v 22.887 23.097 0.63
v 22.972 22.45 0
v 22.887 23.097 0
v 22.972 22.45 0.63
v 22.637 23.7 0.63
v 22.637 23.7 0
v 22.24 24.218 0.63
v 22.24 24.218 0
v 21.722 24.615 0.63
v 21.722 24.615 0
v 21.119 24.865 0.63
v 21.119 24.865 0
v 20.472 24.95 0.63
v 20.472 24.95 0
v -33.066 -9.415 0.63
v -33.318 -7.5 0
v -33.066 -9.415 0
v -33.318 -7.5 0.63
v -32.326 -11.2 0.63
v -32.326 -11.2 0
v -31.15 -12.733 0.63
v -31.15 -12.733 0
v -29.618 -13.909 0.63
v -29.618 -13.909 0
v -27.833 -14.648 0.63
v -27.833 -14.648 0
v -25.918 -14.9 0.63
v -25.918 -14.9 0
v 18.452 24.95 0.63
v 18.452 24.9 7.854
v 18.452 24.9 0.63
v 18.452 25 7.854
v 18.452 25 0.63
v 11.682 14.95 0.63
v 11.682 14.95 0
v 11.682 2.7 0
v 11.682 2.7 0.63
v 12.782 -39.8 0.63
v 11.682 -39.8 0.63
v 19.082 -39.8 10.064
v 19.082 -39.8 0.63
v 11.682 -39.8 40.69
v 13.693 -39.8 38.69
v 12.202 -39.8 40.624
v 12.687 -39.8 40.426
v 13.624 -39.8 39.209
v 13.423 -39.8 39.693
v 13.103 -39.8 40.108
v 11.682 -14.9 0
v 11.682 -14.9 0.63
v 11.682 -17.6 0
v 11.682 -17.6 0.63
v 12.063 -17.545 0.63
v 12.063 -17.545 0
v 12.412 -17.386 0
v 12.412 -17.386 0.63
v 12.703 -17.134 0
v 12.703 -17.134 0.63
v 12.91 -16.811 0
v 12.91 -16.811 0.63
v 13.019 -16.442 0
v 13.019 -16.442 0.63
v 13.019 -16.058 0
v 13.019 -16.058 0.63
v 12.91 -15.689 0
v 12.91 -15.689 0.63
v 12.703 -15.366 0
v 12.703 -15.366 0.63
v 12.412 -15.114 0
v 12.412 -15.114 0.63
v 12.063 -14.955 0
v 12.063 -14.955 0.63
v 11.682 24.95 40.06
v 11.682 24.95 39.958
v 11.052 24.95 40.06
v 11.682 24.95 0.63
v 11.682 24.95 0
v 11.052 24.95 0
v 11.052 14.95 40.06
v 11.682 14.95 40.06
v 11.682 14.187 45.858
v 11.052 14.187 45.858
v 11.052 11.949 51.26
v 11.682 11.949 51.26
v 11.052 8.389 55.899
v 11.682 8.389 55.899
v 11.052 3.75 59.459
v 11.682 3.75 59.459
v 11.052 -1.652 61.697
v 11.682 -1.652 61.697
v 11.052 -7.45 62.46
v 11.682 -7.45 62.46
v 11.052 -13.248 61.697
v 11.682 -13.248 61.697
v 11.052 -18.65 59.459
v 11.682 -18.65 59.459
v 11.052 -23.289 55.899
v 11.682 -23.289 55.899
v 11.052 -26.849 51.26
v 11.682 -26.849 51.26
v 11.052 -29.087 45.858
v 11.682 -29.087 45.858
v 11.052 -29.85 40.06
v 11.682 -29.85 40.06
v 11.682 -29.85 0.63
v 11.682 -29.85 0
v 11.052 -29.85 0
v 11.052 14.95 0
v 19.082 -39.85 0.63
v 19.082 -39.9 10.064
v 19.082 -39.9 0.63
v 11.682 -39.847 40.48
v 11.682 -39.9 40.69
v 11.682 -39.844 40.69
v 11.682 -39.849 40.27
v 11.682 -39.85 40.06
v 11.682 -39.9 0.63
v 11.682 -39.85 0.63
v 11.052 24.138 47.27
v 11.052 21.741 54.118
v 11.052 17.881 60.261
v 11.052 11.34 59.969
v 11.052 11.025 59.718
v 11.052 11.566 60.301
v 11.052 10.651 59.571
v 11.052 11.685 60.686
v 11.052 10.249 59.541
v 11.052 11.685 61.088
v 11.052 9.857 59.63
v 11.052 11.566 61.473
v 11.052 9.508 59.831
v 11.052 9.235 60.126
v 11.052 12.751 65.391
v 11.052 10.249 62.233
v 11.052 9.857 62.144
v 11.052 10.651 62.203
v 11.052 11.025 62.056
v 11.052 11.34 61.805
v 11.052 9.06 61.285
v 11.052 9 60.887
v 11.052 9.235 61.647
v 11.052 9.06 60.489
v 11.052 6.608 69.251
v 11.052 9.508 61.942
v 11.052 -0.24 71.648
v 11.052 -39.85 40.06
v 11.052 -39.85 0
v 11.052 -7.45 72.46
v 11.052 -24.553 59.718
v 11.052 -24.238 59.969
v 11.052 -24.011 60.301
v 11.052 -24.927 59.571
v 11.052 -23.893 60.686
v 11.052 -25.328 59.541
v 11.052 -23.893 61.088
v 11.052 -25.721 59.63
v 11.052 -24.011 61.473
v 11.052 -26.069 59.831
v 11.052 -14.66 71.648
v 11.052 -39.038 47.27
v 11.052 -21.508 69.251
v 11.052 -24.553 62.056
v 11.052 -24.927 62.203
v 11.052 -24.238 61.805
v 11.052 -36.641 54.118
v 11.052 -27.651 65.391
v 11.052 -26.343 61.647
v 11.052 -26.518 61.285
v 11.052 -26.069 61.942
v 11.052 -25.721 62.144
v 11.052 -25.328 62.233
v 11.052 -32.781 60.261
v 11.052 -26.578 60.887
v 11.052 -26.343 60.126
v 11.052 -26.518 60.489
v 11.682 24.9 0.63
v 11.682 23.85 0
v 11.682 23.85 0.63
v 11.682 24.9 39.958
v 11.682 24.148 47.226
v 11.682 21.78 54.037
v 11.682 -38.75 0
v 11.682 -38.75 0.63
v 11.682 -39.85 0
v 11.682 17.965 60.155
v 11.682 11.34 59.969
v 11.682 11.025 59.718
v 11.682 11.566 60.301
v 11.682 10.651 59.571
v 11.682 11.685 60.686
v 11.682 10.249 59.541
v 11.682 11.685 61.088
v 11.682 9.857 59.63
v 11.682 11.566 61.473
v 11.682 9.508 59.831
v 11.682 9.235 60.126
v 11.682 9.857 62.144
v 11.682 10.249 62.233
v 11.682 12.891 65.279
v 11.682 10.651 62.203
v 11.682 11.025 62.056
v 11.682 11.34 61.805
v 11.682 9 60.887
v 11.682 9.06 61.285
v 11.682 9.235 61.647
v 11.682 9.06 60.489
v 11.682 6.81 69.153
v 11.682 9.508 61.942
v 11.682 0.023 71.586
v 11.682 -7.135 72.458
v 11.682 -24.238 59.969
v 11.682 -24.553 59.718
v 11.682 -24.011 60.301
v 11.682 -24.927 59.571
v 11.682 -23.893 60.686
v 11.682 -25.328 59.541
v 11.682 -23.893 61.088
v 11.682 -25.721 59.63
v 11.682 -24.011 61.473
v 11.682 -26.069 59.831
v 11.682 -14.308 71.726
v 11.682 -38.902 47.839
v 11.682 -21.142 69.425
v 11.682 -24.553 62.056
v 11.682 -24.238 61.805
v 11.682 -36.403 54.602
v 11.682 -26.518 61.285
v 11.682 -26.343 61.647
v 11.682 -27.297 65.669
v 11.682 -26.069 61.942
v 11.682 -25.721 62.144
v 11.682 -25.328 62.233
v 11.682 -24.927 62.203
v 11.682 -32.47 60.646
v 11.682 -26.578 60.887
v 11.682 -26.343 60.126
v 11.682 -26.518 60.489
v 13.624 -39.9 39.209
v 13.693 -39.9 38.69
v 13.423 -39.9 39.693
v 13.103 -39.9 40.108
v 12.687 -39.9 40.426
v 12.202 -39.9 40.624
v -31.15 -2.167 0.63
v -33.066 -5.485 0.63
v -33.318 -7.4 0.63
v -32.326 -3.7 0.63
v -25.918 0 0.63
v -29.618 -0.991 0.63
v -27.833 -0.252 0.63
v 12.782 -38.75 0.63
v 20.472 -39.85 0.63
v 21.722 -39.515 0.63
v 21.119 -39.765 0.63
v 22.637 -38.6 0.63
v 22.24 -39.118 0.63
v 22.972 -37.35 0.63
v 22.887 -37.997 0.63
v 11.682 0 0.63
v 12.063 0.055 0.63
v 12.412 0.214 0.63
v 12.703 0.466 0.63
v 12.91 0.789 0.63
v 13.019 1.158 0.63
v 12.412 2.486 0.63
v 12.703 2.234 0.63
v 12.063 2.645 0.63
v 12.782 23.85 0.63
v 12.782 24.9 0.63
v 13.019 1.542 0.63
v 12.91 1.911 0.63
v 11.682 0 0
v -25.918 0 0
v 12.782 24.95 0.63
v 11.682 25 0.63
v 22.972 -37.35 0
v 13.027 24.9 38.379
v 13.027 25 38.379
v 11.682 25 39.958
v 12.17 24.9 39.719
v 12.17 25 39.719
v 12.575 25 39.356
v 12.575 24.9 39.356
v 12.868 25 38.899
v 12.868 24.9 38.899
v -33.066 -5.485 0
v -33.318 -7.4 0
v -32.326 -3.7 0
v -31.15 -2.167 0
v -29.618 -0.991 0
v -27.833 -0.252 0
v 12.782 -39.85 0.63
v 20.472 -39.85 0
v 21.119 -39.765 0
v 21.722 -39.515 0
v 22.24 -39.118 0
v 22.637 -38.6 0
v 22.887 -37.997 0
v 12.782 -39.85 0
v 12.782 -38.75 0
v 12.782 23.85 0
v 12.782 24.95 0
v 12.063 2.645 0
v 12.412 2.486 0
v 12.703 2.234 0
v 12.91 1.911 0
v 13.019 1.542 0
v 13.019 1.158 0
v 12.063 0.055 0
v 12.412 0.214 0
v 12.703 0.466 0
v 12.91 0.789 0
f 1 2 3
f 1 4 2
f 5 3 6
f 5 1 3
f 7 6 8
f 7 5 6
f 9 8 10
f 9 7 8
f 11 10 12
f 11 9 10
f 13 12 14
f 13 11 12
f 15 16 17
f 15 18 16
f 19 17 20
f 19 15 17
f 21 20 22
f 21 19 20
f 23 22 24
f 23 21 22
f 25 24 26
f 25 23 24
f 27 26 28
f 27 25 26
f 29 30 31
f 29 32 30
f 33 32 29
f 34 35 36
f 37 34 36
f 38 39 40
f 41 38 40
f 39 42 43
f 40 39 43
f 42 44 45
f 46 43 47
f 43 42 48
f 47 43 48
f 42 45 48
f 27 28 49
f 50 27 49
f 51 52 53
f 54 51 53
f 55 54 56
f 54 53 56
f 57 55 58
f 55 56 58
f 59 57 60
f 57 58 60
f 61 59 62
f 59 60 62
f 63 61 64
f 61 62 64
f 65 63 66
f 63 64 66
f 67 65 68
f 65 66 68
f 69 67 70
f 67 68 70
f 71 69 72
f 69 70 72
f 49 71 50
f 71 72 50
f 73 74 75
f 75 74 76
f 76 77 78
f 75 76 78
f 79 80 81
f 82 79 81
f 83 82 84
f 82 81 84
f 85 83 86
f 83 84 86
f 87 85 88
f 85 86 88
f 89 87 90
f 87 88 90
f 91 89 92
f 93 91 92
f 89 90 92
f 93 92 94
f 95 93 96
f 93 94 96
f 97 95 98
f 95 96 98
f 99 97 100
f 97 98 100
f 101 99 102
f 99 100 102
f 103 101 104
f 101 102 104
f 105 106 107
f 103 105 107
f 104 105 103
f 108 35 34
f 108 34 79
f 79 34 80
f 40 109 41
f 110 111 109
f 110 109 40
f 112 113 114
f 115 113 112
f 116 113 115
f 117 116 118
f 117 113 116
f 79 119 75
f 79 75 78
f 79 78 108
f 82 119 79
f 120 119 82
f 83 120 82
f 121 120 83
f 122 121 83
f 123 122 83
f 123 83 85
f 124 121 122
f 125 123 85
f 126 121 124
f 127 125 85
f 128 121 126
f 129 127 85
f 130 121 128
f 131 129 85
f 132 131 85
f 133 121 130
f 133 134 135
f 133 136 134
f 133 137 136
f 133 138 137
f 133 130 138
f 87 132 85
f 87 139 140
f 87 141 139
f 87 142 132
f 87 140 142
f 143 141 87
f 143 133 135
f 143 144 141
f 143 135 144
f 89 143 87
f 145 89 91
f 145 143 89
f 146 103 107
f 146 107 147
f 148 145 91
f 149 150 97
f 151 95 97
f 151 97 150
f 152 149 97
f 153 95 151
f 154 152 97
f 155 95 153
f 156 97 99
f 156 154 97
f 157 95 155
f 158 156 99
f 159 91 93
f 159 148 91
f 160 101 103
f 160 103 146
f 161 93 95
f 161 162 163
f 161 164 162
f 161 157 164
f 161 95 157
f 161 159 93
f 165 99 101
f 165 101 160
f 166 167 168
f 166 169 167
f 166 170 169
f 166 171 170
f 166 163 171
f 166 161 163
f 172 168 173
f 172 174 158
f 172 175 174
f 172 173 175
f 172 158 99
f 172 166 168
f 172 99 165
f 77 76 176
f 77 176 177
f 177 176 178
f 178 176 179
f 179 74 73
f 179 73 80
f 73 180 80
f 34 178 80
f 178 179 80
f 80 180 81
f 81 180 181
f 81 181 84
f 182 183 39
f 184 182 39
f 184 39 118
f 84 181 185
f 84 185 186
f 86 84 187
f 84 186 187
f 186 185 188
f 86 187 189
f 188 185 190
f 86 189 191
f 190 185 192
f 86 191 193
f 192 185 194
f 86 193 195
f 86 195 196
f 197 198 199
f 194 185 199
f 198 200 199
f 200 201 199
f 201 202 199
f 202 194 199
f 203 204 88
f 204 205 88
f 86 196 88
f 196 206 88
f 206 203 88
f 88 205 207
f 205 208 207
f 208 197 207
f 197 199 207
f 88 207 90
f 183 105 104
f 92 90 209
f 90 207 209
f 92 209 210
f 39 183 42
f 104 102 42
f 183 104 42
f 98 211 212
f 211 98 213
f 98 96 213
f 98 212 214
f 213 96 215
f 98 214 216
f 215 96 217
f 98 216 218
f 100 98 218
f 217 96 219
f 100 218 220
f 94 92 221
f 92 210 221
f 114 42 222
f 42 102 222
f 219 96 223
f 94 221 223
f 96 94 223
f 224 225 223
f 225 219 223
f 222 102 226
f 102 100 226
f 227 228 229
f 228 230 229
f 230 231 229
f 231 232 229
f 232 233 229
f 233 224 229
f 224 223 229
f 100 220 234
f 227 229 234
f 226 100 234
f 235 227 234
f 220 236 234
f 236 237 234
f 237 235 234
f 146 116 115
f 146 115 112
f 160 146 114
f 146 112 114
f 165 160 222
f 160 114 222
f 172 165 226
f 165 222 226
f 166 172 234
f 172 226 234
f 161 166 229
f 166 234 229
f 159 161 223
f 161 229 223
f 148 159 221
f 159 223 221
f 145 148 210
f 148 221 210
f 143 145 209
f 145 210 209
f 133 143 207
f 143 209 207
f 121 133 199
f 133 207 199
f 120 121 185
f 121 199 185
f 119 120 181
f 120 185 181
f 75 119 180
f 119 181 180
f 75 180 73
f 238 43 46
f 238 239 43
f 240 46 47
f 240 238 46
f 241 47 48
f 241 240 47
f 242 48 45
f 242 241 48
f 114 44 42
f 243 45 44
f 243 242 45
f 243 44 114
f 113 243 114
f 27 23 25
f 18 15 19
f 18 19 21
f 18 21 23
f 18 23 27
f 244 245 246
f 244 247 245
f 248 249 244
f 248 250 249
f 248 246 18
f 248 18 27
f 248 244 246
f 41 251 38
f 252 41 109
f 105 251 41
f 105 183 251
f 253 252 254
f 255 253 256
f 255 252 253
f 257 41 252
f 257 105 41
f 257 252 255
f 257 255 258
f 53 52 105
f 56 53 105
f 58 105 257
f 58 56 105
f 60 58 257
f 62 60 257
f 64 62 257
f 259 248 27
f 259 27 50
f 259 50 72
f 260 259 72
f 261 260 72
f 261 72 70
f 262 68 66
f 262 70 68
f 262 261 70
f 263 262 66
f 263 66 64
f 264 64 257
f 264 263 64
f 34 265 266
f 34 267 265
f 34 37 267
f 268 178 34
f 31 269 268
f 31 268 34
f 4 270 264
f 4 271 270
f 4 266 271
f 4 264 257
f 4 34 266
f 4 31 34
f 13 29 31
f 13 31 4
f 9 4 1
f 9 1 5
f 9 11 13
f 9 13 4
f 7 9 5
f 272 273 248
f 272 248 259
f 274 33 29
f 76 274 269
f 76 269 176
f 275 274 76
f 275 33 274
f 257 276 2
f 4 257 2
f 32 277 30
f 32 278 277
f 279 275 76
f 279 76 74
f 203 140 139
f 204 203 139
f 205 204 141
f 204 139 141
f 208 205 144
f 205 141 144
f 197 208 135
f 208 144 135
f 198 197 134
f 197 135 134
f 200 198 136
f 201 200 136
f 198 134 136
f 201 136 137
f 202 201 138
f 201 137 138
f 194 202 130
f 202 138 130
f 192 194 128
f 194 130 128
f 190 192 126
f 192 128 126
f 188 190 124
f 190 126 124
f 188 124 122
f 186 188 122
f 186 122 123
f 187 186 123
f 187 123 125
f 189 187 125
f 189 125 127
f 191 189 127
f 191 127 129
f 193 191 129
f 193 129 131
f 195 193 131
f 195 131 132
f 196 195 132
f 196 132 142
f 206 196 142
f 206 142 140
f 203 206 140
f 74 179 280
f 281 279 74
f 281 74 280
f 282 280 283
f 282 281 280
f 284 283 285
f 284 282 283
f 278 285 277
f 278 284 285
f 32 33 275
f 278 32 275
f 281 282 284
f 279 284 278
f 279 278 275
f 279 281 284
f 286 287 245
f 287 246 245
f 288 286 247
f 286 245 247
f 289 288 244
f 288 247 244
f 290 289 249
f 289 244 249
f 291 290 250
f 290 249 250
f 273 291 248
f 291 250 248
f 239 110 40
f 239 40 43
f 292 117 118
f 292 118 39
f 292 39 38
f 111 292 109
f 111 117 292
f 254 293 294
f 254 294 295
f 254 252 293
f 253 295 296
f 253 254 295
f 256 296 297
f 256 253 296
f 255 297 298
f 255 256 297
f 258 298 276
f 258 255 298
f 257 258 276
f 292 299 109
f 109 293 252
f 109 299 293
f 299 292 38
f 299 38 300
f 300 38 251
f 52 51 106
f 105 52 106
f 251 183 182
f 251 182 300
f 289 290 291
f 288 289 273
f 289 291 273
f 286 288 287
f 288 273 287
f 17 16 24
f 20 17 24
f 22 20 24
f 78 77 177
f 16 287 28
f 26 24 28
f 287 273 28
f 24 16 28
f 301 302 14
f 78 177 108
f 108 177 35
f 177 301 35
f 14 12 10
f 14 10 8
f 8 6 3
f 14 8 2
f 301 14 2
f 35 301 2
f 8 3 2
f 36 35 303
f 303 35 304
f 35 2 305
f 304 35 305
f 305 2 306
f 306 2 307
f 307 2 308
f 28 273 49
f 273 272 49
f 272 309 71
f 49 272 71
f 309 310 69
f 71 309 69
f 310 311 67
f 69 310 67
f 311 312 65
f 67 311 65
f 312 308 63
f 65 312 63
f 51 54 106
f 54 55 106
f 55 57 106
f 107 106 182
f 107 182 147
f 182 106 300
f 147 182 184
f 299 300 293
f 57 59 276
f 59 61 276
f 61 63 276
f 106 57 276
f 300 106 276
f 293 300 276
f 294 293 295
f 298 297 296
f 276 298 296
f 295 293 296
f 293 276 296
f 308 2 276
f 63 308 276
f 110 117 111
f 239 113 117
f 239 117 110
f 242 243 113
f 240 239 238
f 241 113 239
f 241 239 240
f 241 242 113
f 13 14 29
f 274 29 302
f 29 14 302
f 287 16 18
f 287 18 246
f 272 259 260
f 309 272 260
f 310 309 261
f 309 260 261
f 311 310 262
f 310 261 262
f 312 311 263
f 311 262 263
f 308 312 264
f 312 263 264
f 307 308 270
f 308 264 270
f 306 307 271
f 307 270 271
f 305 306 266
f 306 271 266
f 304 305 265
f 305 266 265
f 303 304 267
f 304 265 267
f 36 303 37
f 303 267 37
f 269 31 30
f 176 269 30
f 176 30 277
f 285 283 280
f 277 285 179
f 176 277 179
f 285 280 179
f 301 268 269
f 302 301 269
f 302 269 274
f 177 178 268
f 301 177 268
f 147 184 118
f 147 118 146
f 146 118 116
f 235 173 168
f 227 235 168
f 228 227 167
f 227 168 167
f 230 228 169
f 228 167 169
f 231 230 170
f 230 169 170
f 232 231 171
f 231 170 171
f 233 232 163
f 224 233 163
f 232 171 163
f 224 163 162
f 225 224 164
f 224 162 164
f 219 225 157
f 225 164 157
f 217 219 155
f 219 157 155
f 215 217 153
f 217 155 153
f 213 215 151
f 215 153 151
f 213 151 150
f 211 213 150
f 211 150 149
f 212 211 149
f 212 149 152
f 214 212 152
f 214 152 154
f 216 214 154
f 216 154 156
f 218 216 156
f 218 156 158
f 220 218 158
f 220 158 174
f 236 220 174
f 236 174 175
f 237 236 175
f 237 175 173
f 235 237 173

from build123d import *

# Parameters (mm, degrees)
F0_W      = 45
F0_H      = 14.9
F1_DEPTH  = 0.63
F2_R      = 7.4
F3_R      = 7.4
F4_DEPTH  = 0.63
F6_W      = 10
F6_H      = 40.06
F7_DEPTH  = 0.63
F8_DEPTH  = 0.63
F10_DEPTH = 0.05
F11_R     = 2.5
F13_DEPTH = 0.05
F15_D     = 2.7
F5_W      = 1.1
F5_H      = 1.1
F16_DEPTH = 0.631


with BuildPart() as f1:
    # F0 (on Top) → F1 (new body)
    with BuildSketch(Plane.XY):
        with Locations((-10.817694, -7.45)):
            Rectangle(F0_W, F0_H)
    extrude(amount=F1_DEPTH)

    # F2
    f2_edges = [f1.edges().sort_by_distance(p)[0] for p in [
        (-33.317694, 0, 0.315),
    ]]
    fillet(f2_edges, radius=F2_R)

    # F3
    f3_edges = [f1.edges().sort_by_distance(p)[0] for p in [
        (-33.317694, -14.9, 0.315),
    ]]
    fillet(f3_edges, radius=F3_R)

    # F0 (on Top) → F4 (join)
    with BuildSketch(Plane.XY):
        Polygon((11.682306, 24.95), (11.682306, 0), (11.682306, -14.9), (11.682306, -39.85), (22.972306, -39.85), (22.972306, 24.95), align=None)
    extrude(amount=F4_DEPTH)

    # F6 (on face) → F7 (join)
    with BuildSketch(Plane(origin=(11.682306, 0, 0), x_dir=(0, -1, 0), z_dir=(-1, 0, 0))):
        with Locations((34.85, 20.03)):
            Rectangle(F6_W, F6_H)
        with Locations((-19.95, 20.03)):
            Rectangle(F6_W, F6_H)
    extrude(amount=F7_DEPTH)

    # F6 (on face) → F8 (join)
    with BuildSketch(Plane(origin=(11.682306, 0, 0), x_dir=(0, -1, 0), z_dir=(-1, 0, 0))):
        with Locations((34.85, 20.03)):
            Rectangle(F6_W, F6_H)
        with BuildLine():
            Line((29.85, 40.06), (39.85, 40.06))
            ThreePointArc((39.85, 40.06), (7.45, 72.46), (-24.95, 40.06))
            Line((-24.95, 40.06), (-14.95, 40.06))
            ThreePointArc((-14.95, 40.06), (7.45, 62.46), (29.85, 40.06))
        make_face()
        with Locations((-19.95, 20.03)):
            Rectangle(F6_W, F6_H)
    extrude(amount=F8_DEPTH)

    # F9 (on face) → F10 (join, symmetric)
    with BuildSketch(Plane.XZ.offset(39.85)):
        with BuildLine():
            Line((11.682306, 36.690054), (11.682306, 0.63))
            Line((11.682306, 0.63), (19.082306, 0.63))
            Line((19.082306, 0.63), (19.082306, 10.063524))
            Line((19.082306, 10.063524), (13.692664, 38.690027))
            ThreePointArc((13.692664, 38.690027), (13.103211, 37.272156), (11.682306, 36.690054))
        make_face()
        with BuildLine():
            Line((11.682306, 40.06), (11.682306, 36.690054))
            ThreePointArc((11.682306, 36.690054), (13.103211, 37.272156), (13.692664, 38.690027))
            ThreePointArc((13.692664, 38.690027), (13.103211, 40.107898), (11.682306, 40.69))
            Line((11.682306, 40.69), (11.682306, 40.06))
        make_face()
    extrude(amount=F10_DEPTH, both=True)

    # F11
    f11_edges = [f1.edges().sort_by_distance(p)[0] for p in [
        (22.972306, -39.85, 0.315),
        (22.972306, 24.95, 0.315),
    ]]
    fillet(f11_edges, radius=F11_R)

    # F12 (on face) → F13 (join, symmetric)
    with BuildSketch(Plane(origin=(0, 24.95, 0), x_dir=(-1, 0, 0), z_dir=(0, 1, 0))):
        with BuildLine():
            Line((-18.452306, 7.854219), (-18.452306, 0.63))
            Line((-18.452306, 0.63), (-11.682306, 0.63))
            Line((-11.682306, 0.63), (-11.682306, 36.161817))
            ThreePointArc((-11.682306, 36.161817), (-12.762503, 37.023069), (-13.026688, 38.379087))
            Line((-13.026688, 38.379087), (-18.452306, 7.854219))
        make_face()
        with BuildLine():
            Line((-11.682306, 36.161817), (-11.682306, 39.958183))
            ThreePointArc((-11.682306, 39.958183), (-12.575161, 39.3565), (-13.026688, 38.379087))
            ThreePointArc((-13.026688, 38.379087), (-12.762503, 37.023069), (-11.682306, 36.161817))
        make_face()
    extrude(amount=F13_DEPTH, both=True)

    # F15 (through all)
    with Locations(Plane.YZ.offset(11.682306)):
        with Locations((-25.227612, 60.88687), (10.350126, 60.88687)):
            Hole(F15_D / 2)

    # F5 (on face) → F16 (cut, through all)
    with BuildSketch(Plane.XY.offset(0.63)):
        with Locations((12.232306, 24.4)):
            Rectangle(F5_W, F5_H)
        with BuildLine():
            ThreePointArc((11.682306, 0), (13.032306, 1.35), (11.682306, 2.7))
            Line((11.682306, 2.7), (11.682306, 0))
        make_face()
        with BuildLine():
            Line((11.682306, -14.9), (11.682306, -17.6))
            ThreePointArc((11.682306, -17.6), (13.032306, -16.25), (11.682306, -14.9))
        make_face()
        with Locations((12.232306, -39.3)):
            Rectangle(F5_W, F5_H)
    extrude(amount=-F16_DEPTH, mode=Mode.SUBTRACT)


solid = f1.part
